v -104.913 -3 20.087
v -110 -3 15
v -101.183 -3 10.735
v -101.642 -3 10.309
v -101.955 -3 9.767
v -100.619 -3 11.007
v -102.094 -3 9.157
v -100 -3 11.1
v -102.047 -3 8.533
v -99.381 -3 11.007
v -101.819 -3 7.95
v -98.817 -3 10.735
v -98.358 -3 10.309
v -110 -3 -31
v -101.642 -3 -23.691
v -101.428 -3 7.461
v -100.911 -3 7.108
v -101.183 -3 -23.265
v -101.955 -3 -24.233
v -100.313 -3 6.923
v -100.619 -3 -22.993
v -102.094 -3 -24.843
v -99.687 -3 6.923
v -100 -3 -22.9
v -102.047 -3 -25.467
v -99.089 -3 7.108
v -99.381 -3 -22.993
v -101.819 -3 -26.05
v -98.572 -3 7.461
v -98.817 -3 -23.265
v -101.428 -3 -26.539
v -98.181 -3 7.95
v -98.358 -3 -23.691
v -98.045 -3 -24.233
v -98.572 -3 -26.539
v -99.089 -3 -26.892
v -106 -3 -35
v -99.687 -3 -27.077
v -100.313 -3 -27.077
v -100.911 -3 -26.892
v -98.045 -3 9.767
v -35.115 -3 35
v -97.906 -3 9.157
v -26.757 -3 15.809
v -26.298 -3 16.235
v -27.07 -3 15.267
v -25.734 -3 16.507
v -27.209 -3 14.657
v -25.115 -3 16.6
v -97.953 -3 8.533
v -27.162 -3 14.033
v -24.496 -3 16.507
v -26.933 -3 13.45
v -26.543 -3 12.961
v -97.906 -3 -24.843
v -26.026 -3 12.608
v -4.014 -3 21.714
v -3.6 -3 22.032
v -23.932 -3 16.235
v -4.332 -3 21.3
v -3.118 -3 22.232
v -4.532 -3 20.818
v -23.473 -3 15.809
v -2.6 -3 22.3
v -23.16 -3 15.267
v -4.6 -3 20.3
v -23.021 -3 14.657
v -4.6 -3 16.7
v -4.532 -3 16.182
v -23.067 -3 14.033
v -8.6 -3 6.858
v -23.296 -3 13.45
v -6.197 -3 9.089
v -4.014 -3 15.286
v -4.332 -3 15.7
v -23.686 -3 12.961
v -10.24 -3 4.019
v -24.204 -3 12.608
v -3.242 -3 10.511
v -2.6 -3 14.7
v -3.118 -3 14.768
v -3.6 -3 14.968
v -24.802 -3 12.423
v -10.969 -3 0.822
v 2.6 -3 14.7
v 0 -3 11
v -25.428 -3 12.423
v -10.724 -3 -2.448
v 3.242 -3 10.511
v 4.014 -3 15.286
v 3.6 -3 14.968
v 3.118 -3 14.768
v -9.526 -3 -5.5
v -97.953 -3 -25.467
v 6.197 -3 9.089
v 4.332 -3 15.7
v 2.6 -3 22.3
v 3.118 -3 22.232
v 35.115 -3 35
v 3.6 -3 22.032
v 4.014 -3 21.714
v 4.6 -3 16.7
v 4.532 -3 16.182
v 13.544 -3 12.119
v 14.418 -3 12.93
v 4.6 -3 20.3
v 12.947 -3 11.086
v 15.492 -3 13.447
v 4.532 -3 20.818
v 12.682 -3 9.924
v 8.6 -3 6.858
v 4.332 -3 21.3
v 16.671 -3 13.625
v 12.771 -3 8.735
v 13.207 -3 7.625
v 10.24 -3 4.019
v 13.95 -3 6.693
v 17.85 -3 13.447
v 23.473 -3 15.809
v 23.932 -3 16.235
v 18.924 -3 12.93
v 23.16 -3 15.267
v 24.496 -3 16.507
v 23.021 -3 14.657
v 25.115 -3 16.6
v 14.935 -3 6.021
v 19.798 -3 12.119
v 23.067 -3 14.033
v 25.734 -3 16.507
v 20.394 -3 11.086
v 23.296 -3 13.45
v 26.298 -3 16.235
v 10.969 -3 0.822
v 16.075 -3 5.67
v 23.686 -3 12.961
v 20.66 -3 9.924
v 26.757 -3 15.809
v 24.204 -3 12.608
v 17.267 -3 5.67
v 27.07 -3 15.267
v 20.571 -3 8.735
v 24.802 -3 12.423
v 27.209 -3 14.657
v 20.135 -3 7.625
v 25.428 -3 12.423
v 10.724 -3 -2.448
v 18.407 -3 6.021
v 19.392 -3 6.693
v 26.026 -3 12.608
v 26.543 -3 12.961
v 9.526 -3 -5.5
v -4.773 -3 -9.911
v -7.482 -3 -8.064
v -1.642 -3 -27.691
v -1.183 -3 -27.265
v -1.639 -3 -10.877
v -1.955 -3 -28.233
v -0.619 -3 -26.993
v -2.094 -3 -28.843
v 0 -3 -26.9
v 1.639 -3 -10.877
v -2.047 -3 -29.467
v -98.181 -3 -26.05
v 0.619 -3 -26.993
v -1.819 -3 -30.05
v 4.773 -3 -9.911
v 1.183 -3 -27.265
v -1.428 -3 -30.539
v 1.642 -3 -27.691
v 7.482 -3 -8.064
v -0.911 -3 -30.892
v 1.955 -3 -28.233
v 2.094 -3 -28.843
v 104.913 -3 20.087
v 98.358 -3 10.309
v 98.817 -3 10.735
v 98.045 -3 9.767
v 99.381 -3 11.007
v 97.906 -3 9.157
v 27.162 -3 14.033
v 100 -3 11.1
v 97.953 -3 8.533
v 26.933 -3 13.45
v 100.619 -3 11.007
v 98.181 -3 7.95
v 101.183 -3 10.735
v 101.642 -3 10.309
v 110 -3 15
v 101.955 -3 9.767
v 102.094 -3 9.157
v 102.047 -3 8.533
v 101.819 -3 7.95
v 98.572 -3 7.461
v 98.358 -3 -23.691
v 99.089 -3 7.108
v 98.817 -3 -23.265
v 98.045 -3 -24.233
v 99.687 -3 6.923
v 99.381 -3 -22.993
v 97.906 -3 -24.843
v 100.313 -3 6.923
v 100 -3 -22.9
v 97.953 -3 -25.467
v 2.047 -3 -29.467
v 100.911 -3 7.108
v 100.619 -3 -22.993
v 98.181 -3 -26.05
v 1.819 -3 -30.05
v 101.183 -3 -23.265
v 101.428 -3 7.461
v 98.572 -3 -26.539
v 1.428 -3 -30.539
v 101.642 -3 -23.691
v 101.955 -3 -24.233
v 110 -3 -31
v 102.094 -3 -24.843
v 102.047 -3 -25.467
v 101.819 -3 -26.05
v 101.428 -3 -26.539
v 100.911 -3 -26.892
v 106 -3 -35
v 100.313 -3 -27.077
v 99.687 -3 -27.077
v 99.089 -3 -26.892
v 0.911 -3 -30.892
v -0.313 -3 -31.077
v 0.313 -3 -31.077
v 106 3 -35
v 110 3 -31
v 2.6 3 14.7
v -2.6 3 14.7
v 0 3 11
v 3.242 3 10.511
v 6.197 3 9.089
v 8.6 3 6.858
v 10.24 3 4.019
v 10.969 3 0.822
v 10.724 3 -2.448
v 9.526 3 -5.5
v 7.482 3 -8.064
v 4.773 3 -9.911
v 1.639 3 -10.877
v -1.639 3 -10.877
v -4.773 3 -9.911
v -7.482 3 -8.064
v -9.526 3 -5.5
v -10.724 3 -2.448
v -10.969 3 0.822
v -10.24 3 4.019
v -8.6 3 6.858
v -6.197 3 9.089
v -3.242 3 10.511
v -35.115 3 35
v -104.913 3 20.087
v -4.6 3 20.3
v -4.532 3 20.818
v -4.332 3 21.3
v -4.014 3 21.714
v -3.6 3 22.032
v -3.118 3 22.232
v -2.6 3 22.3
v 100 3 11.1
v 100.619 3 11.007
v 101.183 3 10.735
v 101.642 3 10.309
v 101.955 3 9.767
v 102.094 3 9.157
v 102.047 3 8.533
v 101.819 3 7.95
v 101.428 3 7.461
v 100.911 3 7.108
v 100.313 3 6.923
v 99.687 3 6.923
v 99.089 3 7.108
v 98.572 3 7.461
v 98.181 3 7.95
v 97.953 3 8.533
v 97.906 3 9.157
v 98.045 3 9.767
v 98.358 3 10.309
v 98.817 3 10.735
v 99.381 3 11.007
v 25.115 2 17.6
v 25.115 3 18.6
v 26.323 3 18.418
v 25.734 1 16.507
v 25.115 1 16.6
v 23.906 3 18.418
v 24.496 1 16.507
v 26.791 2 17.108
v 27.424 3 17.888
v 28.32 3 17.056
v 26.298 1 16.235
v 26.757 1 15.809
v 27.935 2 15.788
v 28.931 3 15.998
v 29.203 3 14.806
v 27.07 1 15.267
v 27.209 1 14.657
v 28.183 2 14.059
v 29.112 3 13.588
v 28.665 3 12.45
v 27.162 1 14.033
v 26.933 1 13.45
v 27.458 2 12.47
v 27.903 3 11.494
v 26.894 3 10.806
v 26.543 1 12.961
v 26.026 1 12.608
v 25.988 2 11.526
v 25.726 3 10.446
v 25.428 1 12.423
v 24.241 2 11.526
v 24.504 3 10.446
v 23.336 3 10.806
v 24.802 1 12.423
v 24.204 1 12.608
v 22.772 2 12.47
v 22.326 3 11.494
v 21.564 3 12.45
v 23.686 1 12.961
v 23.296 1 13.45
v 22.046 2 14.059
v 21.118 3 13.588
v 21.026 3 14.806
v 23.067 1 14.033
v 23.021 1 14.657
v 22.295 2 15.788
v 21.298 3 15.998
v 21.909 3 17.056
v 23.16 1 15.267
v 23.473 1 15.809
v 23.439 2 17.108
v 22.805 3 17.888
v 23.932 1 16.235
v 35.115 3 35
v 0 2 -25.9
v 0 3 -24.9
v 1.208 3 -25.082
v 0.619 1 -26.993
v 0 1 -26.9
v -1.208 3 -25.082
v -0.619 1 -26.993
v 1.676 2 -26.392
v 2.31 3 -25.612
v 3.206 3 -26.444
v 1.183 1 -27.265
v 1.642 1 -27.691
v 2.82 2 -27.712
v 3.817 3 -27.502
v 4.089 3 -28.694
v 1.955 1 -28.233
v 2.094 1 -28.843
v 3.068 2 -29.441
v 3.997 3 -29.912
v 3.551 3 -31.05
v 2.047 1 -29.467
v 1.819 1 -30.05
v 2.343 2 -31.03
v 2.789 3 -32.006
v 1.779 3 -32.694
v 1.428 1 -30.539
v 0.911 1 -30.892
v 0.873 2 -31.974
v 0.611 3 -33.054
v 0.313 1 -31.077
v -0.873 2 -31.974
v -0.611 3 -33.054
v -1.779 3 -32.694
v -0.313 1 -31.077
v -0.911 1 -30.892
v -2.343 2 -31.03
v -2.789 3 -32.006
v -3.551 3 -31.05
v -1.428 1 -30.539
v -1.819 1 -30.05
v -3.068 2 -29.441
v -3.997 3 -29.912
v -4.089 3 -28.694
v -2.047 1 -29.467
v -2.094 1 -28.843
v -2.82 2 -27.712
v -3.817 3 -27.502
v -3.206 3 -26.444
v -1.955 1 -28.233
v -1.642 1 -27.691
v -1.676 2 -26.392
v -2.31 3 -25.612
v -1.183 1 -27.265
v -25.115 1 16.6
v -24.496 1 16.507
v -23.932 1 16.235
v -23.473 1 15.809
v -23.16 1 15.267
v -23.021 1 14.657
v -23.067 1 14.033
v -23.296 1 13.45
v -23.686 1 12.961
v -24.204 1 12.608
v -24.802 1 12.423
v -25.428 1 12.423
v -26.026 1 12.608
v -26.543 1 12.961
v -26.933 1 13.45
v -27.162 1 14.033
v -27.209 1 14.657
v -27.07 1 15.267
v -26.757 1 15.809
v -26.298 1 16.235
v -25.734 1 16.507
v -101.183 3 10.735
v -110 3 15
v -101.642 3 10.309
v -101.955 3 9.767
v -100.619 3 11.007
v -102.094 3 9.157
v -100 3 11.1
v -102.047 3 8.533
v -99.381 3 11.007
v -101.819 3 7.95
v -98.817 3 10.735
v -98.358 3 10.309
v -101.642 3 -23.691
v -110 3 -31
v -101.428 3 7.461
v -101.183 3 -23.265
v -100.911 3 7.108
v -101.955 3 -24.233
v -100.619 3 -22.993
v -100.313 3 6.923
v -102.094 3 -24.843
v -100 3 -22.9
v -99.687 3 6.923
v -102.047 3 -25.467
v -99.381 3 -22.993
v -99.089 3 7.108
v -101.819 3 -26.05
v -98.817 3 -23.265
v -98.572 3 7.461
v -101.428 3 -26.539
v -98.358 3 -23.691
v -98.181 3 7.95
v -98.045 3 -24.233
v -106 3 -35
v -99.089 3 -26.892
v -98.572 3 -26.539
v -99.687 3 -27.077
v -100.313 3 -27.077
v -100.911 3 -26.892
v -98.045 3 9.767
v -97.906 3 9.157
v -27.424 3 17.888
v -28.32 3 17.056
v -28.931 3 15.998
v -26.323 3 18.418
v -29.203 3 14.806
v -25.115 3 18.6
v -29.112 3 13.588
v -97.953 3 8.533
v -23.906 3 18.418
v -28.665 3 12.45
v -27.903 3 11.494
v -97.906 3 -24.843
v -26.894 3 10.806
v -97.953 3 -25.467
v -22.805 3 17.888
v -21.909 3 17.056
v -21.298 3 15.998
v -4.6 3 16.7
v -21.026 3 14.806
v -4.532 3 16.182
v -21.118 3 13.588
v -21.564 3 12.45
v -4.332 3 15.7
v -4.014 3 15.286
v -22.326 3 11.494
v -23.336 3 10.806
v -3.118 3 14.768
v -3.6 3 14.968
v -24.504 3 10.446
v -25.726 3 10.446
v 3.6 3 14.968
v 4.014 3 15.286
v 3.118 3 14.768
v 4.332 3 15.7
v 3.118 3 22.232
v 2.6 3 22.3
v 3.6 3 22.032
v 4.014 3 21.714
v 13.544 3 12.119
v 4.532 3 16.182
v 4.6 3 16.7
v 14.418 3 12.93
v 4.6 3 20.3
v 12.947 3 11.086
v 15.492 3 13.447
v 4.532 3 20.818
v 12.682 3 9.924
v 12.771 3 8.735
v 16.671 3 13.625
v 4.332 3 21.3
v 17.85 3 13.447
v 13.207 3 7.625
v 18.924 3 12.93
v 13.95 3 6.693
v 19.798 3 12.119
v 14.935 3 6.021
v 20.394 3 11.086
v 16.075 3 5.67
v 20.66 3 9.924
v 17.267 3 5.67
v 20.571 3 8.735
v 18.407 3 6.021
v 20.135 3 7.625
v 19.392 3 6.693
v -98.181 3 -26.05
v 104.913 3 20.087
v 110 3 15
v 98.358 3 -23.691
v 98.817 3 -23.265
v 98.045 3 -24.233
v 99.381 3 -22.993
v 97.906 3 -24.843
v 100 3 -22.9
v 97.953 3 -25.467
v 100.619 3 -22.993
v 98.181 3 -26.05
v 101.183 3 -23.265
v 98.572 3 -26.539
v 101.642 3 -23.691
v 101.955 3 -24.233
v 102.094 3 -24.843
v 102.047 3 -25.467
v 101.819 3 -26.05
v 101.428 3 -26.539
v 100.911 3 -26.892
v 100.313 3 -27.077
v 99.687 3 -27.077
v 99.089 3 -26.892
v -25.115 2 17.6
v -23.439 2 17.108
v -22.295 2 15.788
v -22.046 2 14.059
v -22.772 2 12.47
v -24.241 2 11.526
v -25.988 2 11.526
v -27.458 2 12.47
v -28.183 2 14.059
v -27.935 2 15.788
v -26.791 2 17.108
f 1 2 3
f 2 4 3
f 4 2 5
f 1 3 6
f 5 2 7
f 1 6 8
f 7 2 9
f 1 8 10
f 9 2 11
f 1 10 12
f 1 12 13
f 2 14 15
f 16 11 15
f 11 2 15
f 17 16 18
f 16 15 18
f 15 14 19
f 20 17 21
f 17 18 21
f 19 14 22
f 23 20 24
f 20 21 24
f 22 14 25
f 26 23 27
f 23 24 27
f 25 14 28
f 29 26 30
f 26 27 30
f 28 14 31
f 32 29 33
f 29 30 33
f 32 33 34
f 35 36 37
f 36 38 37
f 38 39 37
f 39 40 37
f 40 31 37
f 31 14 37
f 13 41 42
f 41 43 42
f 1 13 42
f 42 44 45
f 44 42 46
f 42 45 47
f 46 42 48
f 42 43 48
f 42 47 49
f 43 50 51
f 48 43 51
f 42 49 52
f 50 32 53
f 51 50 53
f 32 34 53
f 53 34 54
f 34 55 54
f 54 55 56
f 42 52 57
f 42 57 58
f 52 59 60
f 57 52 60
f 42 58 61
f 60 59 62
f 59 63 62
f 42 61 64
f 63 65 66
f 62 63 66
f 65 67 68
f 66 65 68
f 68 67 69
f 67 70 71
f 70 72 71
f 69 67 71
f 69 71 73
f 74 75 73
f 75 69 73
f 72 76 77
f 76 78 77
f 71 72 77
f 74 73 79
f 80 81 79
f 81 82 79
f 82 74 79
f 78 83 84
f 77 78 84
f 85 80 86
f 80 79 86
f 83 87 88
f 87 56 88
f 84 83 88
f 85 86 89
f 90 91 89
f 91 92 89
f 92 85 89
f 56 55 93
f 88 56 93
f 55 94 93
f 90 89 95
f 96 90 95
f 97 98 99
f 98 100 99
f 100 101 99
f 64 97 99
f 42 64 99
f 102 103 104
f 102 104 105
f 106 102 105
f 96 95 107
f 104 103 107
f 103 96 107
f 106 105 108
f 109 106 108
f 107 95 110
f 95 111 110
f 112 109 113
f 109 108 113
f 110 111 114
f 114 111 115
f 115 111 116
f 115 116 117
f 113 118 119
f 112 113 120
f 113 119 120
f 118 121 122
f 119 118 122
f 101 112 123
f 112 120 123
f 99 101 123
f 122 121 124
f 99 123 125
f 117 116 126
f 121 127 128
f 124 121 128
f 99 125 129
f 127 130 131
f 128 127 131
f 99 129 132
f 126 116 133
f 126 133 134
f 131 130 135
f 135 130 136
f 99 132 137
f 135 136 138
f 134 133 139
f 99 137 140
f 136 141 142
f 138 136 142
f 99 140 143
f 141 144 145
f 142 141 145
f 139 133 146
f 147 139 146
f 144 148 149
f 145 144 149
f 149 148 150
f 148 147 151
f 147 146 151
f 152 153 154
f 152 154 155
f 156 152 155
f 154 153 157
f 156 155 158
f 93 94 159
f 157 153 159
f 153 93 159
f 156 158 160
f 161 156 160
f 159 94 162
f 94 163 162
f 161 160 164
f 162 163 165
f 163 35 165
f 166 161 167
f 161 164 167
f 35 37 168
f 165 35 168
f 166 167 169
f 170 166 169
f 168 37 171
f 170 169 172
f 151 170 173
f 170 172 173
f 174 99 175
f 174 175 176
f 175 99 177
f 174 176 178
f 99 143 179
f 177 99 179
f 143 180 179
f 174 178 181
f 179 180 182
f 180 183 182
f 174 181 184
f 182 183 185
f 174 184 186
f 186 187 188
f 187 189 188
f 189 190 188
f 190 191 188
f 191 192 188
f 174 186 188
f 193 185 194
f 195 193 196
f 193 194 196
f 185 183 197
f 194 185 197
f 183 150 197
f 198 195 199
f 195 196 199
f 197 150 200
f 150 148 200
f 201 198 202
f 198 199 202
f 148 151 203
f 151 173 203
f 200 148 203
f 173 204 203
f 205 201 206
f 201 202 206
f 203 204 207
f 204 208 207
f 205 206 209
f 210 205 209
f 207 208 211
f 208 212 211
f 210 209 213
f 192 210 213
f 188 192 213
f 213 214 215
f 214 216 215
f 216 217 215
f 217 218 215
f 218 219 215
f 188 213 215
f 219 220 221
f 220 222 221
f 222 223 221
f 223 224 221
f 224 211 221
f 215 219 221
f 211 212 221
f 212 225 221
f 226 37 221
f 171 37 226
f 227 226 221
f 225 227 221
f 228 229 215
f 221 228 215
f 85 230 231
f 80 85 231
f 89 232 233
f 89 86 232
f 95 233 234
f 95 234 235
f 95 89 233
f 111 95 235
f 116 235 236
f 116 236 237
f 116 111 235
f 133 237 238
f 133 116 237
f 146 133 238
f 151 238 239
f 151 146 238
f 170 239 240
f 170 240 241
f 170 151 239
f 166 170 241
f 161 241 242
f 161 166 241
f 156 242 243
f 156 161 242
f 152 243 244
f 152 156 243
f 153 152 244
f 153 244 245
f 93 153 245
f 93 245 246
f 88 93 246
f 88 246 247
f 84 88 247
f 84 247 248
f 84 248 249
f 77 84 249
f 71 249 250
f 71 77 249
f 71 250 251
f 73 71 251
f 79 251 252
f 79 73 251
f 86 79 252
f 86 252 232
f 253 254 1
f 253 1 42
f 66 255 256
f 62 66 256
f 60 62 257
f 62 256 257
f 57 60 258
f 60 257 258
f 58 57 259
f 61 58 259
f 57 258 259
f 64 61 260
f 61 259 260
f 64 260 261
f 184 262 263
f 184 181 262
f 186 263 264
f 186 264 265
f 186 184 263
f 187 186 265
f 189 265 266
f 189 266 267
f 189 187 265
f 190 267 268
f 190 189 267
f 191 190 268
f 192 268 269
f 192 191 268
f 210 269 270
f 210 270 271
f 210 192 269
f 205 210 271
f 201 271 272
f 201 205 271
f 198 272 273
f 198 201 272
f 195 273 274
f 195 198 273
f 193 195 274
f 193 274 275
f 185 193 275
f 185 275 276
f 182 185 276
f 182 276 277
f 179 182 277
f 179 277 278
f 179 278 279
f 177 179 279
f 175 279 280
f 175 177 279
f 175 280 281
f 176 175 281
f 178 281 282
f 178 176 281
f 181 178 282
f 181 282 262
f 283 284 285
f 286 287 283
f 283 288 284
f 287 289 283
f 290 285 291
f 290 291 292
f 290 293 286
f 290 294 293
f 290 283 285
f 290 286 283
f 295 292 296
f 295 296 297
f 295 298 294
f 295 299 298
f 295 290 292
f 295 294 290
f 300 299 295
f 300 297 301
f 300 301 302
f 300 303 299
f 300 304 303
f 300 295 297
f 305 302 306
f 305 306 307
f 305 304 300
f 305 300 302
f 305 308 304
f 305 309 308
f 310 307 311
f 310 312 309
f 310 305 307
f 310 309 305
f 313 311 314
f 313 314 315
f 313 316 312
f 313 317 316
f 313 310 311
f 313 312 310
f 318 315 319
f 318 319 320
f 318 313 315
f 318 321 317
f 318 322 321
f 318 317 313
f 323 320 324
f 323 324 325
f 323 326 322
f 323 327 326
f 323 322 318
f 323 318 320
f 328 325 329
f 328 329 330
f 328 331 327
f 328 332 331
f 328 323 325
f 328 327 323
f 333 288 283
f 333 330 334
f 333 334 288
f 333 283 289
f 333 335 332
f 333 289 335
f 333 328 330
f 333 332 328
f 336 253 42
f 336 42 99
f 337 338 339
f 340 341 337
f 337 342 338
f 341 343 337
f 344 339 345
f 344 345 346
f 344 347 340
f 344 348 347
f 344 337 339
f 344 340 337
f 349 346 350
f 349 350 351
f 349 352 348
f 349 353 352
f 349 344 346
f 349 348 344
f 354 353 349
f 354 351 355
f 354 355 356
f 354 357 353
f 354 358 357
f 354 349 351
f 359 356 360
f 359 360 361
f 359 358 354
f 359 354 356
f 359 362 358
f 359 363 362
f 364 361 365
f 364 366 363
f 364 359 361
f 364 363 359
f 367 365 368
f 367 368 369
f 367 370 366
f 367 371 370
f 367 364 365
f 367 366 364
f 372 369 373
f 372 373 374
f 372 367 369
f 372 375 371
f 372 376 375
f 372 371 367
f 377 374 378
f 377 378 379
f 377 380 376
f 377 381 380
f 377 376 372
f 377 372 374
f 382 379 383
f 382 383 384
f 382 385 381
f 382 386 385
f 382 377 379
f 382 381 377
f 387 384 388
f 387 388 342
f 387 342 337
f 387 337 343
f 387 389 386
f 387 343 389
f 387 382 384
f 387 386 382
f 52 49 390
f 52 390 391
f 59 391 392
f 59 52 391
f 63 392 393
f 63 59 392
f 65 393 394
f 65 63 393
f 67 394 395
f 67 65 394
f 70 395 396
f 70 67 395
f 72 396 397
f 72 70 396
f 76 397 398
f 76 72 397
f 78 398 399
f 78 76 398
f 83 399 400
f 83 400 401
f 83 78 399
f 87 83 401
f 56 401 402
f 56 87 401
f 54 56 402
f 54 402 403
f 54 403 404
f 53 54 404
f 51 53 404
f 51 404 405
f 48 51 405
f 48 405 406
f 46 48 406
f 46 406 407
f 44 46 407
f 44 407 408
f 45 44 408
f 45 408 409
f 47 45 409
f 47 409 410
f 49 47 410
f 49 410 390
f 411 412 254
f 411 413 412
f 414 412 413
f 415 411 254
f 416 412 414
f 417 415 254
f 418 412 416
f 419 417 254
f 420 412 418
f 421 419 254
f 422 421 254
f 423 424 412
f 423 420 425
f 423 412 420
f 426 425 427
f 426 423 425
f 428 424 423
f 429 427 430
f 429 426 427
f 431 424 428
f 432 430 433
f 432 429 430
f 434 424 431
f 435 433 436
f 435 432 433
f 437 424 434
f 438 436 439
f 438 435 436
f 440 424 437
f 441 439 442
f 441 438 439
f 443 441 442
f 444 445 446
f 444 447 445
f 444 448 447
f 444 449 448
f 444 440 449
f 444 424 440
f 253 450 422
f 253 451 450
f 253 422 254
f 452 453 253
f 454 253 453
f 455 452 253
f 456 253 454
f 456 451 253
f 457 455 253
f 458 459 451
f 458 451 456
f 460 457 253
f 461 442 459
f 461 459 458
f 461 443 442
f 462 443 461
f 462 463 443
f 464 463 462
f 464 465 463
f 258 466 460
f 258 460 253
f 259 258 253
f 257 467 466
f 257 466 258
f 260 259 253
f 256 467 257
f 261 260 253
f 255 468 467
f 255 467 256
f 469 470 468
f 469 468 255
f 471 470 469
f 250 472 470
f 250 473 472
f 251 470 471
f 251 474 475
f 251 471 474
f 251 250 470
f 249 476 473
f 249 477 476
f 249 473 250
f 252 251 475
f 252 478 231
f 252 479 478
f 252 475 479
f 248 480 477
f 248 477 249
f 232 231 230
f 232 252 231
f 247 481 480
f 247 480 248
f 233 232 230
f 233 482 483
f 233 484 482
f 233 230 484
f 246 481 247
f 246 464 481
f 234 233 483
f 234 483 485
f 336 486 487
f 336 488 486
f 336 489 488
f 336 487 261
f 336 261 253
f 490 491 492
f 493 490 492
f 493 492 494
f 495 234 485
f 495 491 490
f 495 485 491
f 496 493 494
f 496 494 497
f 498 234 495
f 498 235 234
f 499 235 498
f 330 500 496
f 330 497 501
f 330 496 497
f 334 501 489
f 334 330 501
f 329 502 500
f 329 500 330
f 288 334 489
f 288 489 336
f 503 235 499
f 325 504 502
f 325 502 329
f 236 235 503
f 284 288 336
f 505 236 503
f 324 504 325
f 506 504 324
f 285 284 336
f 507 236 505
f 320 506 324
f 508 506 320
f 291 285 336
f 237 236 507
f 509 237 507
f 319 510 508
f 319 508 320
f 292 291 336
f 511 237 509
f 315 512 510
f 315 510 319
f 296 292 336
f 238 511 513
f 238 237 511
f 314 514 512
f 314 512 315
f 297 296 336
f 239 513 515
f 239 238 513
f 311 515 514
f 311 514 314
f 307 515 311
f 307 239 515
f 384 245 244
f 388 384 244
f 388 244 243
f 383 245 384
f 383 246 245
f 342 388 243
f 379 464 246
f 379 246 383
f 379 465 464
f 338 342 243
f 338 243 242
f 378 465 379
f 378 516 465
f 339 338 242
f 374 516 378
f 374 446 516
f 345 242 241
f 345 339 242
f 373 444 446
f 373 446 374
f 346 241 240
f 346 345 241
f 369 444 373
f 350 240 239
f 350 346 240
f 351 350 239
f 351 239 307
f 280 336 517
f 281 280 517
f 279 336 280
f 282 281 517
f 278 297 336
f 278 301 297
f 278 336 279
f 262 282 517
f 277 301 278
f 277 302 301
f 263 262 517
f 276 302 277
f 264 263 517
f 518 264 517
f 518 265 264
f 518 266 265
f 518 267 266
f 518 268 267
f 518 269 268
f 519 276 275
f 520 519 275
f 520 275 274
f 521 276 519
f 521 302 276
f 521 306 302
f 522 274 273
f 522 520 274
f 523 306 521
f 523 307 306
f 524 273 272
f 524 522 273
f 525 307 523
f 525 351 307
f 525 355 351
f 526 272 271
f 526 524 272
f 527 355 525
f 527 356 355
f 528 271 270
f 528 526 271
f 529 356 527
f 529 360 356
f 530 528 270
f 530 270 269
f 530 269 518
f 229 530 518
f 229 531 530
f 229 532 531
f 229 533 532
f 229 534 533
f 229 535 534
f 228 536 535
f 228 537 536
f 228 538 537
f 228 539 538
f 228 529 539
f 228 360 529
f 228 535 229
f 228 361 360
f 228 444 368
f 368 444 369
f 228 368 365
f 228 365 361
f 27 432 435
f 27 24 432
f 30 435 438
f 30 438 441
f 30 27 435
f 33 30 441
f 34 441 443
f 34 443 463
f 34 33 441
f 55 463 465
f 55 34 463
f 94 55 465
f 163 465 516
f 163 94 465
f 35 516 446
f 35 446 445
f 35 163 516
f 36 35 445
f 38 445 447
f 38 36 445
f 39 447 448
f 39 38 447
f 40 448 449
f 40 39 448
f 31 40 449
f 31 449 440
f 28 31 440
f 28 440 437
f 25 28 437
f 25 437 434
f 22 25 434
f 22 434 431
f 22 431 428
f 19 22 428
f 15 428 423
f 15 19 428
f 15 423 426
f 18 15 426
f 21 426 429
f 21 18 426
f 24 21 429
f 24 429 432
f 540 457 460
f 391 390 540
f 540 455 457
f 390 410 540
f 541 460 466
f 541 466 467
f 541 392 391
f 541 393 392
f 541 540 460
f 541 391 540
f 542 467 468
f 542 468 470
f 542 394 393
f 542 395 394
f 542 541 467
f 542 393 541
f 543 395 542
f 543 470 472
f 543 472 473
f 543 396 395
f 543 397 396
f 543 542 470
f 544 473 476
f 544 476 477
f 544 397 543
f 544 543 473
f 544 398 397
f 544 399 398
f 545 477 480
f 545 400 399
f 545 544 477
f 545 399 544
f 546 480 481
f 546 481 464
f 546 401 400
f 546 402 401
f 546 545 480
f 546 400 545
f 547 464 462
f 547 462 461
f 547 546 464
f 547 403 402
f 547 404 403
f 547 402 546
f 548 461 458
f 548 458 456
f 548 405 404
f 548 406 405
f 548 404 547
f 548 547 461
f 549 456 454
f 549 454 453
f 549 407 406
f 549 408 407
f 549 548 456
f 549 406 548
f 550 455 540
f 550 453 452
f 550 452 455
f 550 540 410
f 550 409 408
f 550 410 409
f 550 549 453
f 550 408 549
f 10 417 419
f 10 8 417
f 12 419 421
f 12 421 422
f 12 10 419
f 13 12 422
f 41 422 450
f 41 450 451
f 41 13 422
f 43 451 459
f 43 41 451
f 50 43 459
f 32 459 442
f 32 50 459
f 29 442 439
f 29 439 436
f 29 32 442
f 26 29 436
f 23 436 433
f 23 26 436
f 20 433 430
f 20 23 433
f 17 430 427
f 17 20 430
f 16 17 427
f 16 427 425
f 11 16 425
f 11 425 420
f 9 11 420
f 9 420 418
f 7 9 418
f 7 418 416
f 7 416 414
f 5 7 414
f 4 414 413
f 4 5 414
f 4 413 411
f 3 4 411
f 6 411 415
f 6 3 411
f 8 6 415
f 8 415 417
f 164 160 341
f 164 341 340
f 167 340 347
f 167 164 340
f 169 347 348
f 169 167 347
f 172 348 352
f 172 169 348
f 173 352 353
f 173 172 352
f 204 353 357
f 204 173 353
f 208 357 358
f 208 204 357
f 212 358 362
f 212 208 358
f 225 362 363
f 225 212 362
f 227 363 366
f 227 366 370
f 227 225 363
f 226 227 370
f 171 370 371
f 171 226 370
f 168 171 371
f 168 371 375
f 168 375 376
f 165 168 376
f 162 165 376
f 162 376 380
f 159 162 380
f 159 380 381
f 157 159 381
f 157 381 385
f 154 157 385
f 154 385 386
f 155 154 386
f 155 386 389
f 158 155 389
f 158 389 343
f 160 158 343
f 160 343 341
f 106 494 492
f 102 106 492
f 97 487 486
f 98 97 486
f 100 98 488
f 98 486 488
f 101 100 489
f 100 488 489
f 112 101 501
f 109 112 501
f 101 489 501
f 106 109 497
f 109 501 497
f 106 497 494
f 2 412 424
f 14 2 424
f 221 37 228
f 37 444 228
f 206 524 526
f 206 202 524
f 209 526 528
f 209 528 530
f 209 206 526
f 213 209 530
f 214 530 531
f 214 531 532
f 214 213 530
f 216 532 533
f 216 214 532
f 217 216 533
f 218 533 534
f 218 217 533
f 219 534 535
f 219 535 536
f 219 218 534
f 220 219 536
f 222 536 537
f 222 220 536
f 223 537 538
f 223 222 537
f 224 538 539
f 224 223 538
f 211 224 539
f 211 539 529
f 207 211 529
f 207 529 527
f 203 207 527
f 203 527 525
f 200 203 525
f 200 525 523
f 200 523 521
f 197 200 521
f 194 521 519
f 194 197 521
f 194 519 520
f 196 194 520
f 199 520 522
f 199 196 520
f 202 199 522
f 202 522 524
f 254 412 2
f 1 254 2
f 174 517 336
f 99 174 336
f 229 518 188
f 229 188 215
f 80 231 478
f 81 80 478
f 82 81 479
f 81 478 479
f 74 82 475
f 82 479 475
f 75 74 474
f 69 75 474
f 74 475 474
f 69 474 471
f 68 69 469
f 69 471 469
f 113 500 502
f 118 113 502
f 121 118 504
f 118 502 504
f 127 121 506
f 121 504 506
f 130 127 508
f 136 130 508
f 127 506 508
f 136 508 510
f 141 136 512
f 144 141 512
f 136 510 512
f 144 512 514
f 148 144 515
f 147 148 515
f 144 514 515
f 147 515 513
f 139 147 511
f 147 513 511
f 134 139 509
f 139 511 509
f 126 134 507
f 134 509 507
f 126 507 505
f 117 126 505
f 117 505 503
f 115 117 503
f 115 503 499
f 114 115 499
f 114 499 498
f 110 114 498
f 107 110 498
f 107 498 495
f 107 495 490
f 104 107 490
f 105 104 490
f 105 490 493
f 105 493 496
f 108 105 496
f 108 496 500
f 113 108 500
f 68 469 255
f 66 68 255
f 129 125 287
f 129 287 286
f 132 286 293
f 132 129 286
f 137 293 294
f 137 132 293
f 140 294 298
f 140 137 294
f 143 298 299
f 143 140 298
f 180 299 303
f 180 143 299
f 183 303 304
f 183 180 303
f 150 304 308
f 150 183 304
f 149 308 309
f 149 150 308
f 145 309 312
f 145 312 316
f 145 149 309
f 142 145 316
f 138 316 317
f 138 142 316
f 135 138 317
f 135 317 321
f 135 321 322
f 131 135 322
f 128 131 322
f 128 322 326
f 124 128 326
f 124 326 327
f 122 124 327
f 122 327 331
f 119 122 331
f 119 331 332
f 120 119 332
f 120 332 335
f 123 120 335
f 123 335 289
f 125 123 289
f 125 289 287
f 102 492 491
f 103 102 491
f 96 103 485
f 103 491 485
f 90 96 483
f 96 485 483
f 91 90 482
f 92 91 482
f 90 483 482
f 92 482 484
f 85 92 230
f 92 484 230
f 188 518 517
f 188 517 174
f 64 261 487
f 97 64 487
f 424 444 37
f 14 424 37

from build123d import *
from OCP.BRepFilletAPI import BRepFilletAPI_MakeChamfer

# Parameters (mm, degrees)
SKETCH_1_W          = 220
SKETCH_1_H          = 70
SKETCH_1_R          = 2.1
SKETCH_1_R_2        = 11
EXTRUDE_1_DEPTH     = 3
SKETCH_2_R          = 4
CUT_EXTRUDE_1_DEPTH = 116.589791937
CUT_EXTRUDE_2_DEPTH = 116.589791937
CHAMFER_1_SIZE      = 2
CUT_EXTRUDE_3_DEPTH = 116.589791937
CHAMFER_3_SIZE      = 4
CHAMFER_3_SIZE2     = 5.201672953


with BuildPart() as part:
    # 草图1 → 凸台-拉伸1 (new, symmetric)
    with BuildSketch(Plane(origin=(0, 0, 0), x_dir=(1, 0, 0), z_dir=(0, 1, 0))):
        Rectangle(SKETCH_1_W, SKETCH_1_H)
        with Locations(Location((-100, 25, 0), (0, 0, 270))):
            Circle(SKETCH_1_R, mode=Mode.SUBTRACT)
        with Locations(Location((100, 25, 0), (0, 0, 270))):
            Circle(SKETCH_1_R, mode=Mode.SUBTRACT)
        with Locations(Location((0, 29, 0), (0, 0, 270))):
            Circle(SKETCH_1_R, mode=Mode.SUBTRACT)
        with Locations(Location((25.11473671, -14.5, 0), (0, 0, 270))):
            Circle(SKETCH_1_R, mode=Mode.SUBTRACT)
        with Locations(Location((-25.11473671, -14.5, 0), (0, 0, 270))):
            Circle(SKETCH_1_R, mode=Mode.SUBTRACT)
        with Locations(Location((0, 0, 0), (0, 0, 270))):
            Circle(SKETCH_1_R_2, mode=Mode.SUBTRACT)
        with Locations(Location((-100, -9, 0), (0, 0, 270))):
            Circle(SKETCH_1_R, mode=Mode.SUBTRACT)
        with Locations(Location((100, -9, 0), (0, 0, 270))):
            Circle(SKETCH_1_R, mode=Mode.SUBTRACT)
    extrude(amount=EXTRUDE_1_DEPTH, both=True)

    # 草图2 → 切除-拉伸1 (cut, through all)
    with BuildSketch(Plane(origin=(0, 3, 0), x_dir=(1, 0, 0), z_dir=(0, 1, 0))):
        with Locations(Location((16.670989023, -9.625, 0), (0, 0, 270))):
            Circle(SKETCH_2_R)
    extrude(amount=-CUT_EXTRUDE_1_DEPTH, mode=Mode.SUBTRACT)

    # 草图3 → 切除-拉伸2 (cut, through all)
    with BuildSketch(Plane(origin=(0, 3, 0), x_dir=(1, 0, 0), z_dir=(0, 1, 0))):
        with BuildLine():
            Line((4.6, -20.3), (4.6, -16.7))
            ThreePointArc((4.6, -16.7), (4.014213562, -15.285786438), (2.6, -14.7))
            Line((2.6, -14.7), (-2.6, -14.7))
            ThreePointArc((-2.6, -14.7), (-4.014213562, -15.285786438), (-4.6, -16.7))
            Line((-4.6, -16.7), (-4.6, -20.3))
            ThreePointArc((-4.6, -20.3), (-4.014213562, -21.714213562), (-2.6, -22.3))
            Line((-2.6, -22.3), (2.6, -22.3))
            ThreePointArc((2.6, -22.3), (4.014213562, -21.714213562), (4.6, -20.3))
        make_face()
    extrude(amount=-CUT_EXTRUDE_2_DEPTH, mode=Mode.SUBTRACT)

    # 倒角1
    chamfer_1_edges = [part.edges().sort_by_distance(p)[0] for p in [
        (0, 3, -31.1),
        (25.11473671, 3, 12.4),
        (-25.11473671, 3, 12.4),
    ]]
    chamfer(chamfer_1_edges, length=CHAMFER_1_SIZE)

    # 草图5 → 切除-拉伸3 (cut, through all)
    with BuildSketch(Plane(origin=(0, 3, 0), x_dir=(1, 0, 0), z_dir=(0, 1, 0))):
        Polygon((-110, -19), (-35.11473671, -35), (-110, -35), align=None)
        Polygon((35.11473671, -35), (110, -35), (110, -19), align=None)
    extrude(amount=-CUT_EXTRUDE_3_DEPTH, mode=Mode.SUBTRACT)

    # 倒角3: one chamfer whose edges measure the first distance from different faces: ONE call of the kernel's chamfer builder (chamfer() names one face for all edges)
    chamfer_3_edges_1 = [part.edges().sort_by_distance(p)[0] for p in [
        (110, 0, 19),
    ]]
    chamfer_3_side_1 = [part.faces().sort_by_distance(p)[0] for p in [
        (110, 0, -8),
    ]]
    chamfer_3_edges_2 = [part.edges().sort_by_distance(p)[0] for p in [
        (-110, 0, -35),
        (110, 0, -35),
    ]]
    chamfer_3_edges_3 = [part.edges().sort_by_distance(p)[0] for p in [
        (-110, 0, 19),
    ]]
    chamfer_3_side_3 = [part.faces().sort_by_distance(p)[0] for p in [
        (-110, 0, -8),
    ]]
    chamfer_3 = BRepFilletAPI_MakeChamfer(part.part.solid().wrapped)
    for e in chamfer_3_edges_1:
        chamfer_3.Add(CHAMFER_3_SIZE, CHAMFER_3_SIZE2, e.wrapped, chamfer_3_side_1[0].wrapped)  # the first distance lies on this face
    for e in chamfer_3_edges_2:
        chamfer_3.Add(CHAMFER_3_SIZE, e.wrapped)
    for e in chamfer_3_edges_3:
        chamfer_3.Add(CHAMFER_3_SIZE, CHAMFER_3_SIZE2, e.wrapped, chamfer_3_side_3[0].wrapped)  # the first distance lies on this face
    add(Compound.cast(chamfer_3.Shape()), mode=Mode.REPLACE)


solid = part.part
